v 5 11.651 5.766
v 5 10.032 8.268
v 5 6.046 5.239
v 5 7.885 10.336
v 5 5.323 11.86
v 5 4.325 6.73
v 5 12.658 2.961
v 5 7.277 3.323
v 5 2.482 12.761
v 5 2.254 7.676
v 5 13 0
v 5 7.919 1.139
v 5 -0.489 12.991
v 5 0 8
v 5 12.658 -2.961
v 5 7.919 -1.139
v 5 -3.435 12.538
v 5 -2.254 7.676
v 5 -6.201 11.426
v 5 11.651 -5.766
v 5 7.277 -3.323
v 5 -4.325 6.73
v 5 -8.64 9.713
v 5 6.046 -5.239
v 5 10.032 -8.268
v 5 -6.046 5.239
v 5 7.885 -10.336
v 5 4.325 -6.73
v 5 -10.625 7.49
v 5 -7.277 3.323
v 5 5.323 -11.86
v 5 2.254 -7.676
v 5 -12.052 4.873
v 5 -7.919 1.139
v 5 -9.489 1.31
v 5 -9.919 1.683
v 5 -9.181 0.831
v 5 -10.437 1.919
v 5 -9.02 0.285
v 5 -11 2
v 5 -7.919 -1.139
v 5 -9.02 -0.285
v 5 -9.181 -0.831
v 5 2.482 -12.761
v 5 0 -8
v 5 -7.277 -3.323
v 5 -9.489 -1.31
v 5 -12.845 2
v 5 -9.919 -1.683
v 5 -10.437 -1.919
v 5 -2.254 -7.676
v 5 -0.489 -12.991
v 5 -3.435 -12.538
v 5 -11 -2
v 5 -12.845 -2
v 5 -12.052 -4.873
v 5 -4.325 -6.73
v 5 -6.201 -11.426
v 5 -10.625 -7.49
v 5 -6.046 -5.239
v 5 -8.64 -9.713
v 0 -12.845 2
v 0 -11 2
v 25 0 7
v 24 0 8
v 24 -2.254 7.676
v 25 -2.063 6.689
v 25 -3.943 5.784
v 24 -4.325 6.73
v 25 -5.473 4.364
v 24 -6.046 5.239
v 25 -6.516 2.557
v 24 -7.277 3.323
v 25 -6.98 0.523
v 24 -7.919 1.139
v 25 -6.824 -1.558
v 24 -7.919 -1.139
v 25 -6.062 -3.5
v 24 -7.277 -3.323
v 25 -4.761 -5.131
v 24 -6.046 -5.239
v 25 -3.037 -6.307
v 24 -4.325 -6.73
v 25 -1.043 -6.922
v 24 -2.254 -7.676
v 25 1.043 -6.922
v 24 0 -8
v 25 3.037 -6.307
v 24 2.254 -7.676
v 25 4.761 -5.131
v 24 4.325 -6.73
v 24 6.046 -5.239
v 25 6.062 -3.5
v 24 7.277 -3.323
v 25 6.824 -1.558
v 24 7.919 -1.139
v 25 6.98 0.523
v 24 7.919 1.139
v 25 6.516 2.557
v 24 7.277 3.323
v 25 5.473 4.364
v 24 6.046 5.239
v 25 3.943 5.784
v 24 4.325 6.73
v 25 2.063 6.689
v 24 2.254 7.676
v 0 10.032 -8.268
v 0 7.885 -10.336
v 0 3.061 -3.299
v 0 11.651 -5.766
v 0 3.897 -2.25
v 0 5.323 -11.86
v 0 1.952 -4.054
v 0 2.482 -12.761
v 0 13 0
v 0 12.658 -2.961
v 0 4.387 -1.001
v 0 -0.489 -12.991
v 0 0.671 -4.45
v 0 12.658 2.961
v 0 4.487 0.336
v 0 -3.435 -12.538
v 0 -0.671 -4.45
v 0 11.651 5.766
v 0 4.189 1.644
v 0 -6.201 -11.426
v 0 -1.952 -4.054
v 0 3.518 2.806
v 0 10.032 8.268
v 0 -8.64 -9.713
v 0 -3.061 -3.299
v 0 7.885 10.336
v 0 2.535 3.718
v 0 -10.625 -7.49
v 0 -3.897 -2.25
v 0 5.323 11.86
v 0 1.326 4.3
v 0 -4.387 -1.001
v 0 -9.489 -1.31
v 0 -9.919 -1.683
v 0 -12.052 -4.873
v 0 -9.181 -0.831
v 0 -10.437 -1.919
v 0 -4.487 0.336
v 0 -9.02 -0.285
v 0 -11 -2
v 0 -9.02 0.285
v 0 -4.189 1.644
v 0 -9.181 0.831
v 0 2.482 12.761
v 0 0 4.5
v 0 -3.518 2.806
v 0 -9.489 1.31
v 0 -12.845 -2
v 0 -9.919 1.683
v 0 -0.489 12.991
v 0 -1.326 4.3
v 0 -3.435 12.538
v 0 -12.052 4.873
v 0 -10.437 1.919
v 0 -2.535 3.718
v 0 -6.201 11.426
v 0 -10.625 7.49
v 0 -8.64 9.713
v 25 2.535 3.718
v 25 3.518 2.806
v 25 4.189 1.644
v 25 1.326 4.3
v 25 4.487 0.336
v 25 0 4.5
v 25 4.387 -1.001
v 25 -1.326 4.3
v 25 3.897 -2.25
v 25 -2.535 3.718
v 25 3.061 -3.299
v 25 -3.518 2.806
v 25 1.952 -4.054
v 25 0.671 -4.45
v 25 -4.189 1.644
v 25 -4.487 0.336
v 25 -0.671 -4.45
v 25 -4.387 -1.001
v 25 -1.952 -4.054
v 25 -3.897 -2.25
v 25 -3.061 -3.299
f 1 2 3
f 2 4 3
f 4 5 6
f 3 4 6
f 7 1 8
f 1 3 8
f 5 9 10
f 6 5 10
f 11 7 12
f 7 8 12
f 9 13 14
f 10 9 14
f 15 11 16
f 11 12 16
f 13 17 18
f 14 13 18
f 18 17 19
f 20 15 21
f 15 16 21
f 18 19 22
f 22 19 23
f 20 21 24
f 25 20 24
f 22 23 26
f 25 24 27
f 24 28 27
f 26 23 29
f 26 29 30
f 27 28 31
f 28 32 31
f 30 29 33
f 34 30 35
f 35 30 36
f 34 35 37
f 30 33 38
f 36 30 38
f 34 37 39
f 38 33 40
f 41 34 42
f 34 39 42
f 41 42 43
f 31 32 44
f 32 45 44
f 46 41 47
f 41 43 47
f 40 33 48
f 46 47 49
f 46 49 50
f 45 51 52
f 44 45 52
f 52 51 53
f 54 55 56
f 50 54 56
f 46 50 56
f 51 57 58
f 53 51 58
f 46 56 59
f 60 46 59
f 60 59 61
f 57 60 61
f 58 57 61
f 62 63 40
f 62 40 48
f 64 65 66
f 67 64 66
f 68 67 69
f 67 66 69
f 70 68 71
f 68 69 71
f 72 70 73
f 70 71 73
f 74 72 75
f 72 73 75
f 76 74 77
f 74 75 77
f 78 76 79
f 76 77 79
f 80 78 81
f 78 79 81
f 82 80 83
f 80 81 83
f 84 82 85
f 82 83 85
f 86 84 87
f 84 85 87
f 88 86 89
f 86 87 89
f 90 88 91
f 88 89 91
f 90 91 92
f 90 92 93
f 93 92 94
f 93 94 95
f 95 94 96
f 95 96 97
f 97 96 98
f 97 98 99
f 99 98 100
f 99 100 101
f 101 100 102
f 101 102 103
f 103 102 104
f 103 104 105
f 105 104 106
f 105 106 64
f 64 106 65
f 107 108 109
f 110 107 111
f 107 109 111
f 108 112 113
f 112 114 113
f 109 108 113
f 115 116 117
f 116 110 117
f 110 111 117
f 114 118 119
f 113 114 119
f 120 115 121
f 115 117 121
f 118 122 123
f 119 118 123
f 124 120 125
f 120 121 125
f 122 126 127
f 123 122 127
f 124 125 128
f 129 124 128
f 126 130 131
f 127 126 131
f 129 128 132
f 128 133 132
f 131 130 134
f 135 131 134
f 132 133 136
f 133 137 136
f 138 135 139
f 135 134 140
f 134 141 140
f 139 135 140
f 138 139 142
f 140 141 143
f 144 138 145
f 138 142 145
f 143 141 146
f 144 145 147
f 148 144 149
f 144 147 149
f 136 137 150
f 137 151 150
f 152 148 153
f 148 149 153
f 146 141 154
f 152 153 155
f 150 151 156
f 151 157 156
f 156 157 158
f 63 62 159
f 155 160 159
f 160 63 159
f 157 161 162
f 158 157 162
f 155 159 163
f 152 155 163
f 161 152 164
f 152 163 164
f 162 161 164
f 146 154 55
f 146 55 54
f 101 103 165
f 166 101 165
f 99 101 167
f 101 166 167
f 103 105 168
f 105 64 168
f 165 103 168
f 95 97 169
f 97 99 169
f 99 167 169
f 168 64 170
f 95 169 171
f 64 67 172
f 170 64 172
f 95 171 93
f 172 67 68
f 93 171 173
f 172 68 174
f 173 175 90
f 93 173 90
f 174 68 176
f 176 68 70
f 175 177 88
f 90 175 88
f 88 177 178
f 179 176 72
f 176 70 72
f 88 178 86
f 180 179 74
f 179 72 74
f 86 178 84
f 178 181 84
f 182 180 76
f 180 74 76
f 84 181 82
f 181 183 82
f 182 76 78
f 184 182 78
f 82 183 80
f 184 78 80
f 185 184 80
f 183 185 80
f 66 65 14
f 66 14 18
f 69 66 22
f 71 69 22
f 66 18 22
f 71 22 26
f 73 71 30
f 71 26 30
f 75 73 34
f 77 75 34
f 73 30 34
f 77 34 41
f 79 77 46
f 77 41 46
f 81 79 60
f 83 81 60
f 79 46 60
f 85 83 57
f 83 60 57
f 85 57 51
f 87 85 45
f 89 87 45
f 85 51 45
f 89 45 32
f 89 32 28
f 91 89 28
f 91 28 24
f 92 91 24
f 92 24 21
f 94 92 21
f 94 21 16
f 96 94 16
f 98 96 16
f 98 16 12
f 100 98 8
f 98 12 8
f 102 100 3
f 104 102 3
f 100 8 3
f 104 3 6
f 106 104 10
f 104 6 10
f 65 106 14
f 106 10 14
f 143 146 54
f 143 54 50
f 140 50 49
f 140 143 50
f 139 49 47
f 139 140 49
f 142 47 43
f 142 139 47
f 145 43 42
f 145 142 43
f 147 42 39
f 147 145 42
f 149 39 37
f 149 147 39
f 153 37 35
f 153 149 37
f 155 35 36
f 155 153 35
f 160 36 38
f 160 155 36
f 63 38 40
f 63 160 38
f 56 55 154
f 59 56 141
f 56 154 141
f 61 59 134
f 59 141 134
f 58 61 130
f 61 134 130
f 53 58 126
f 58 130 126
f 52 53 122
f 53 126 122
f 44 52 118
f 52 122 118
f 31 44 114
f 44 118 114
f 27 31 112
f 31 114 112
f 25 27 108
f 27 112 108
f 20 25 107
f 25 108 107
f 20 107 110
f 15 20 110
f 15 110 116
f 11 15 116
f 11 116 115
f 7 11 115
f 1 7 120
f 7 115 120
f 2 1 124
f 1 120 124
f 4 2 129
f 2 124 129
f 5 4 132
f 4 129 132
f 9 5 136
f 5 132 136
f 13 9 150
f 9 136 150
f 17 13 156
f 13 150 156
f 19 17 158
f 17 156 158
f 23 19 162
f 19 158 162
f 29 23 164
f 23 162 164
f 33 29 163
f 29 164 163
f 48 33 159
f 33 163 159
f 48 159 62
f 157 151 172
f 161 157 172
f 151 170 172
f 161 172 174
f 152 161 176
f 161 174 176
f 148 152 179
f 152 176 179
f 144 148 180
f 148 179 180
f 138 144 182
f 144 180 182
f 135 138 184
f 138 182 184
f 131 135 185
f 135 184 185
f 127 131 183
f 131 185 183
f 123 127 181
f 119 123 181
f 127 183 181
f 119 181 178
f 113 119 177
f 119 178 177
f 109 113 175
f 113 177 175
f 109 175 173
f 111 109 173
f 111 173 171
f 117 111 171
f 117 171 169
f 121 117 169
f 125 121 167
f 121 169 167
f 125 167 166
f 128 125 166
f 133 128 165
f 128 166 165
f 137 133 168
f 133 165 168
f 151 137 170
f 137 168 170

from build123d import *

# Parameters (mm, degrees)
CHANFREIN2_SIZE         = 1
ENL_V_MAT_EXTRU_1_DEPTH = 32.032241298


with BuildPart() as part:
    # Esquisse1 → Base-Révolution (revolve)
    with BuildSketch(Plane.XY, mode=Mode.PRIVATE) as base_r_volution_sk:
        Polygon((0, 4.5), (25, 4.5), (25, 8), (5, 8), (5, 13), (0, 13), align=None)
    revolve(base_r_volution_sk.sketch.rotate(Axis((0, 0, 0), (1, 0, 0)), 90), axis=Axis((0, 0, 0), (1, 0, 0)))

    # Chanfrein2
    chanfrein2_edges = [part.edges().sort_by_distance(p)[0] for p in [
        (25, 0, -8),
    ]]
    chamfer(chanfrein2_edges, length=CHANFREIN2_SIZE)

    # Esquisse2 → Enlèv. mat.-Extru.1 (cut, through all)
    with BuildSketch(Plane.ZY):
        with BuildLine():
            Line((2, -11), (2, -12.845232579))
            ThreePointArc((2, -12.845232579), (0, -13), (-2, -12.845232579))
            Line((-2, -12.845232579), (-2, -11))
            ThreePointArc((-2, -11), (0, -9), (2, -11))
        make_face()
    extrude(amount=-ENL_V_MAT_EXTRU_1_DEPTH, mode=Mode.SUBTRACT)


solid = part.part
